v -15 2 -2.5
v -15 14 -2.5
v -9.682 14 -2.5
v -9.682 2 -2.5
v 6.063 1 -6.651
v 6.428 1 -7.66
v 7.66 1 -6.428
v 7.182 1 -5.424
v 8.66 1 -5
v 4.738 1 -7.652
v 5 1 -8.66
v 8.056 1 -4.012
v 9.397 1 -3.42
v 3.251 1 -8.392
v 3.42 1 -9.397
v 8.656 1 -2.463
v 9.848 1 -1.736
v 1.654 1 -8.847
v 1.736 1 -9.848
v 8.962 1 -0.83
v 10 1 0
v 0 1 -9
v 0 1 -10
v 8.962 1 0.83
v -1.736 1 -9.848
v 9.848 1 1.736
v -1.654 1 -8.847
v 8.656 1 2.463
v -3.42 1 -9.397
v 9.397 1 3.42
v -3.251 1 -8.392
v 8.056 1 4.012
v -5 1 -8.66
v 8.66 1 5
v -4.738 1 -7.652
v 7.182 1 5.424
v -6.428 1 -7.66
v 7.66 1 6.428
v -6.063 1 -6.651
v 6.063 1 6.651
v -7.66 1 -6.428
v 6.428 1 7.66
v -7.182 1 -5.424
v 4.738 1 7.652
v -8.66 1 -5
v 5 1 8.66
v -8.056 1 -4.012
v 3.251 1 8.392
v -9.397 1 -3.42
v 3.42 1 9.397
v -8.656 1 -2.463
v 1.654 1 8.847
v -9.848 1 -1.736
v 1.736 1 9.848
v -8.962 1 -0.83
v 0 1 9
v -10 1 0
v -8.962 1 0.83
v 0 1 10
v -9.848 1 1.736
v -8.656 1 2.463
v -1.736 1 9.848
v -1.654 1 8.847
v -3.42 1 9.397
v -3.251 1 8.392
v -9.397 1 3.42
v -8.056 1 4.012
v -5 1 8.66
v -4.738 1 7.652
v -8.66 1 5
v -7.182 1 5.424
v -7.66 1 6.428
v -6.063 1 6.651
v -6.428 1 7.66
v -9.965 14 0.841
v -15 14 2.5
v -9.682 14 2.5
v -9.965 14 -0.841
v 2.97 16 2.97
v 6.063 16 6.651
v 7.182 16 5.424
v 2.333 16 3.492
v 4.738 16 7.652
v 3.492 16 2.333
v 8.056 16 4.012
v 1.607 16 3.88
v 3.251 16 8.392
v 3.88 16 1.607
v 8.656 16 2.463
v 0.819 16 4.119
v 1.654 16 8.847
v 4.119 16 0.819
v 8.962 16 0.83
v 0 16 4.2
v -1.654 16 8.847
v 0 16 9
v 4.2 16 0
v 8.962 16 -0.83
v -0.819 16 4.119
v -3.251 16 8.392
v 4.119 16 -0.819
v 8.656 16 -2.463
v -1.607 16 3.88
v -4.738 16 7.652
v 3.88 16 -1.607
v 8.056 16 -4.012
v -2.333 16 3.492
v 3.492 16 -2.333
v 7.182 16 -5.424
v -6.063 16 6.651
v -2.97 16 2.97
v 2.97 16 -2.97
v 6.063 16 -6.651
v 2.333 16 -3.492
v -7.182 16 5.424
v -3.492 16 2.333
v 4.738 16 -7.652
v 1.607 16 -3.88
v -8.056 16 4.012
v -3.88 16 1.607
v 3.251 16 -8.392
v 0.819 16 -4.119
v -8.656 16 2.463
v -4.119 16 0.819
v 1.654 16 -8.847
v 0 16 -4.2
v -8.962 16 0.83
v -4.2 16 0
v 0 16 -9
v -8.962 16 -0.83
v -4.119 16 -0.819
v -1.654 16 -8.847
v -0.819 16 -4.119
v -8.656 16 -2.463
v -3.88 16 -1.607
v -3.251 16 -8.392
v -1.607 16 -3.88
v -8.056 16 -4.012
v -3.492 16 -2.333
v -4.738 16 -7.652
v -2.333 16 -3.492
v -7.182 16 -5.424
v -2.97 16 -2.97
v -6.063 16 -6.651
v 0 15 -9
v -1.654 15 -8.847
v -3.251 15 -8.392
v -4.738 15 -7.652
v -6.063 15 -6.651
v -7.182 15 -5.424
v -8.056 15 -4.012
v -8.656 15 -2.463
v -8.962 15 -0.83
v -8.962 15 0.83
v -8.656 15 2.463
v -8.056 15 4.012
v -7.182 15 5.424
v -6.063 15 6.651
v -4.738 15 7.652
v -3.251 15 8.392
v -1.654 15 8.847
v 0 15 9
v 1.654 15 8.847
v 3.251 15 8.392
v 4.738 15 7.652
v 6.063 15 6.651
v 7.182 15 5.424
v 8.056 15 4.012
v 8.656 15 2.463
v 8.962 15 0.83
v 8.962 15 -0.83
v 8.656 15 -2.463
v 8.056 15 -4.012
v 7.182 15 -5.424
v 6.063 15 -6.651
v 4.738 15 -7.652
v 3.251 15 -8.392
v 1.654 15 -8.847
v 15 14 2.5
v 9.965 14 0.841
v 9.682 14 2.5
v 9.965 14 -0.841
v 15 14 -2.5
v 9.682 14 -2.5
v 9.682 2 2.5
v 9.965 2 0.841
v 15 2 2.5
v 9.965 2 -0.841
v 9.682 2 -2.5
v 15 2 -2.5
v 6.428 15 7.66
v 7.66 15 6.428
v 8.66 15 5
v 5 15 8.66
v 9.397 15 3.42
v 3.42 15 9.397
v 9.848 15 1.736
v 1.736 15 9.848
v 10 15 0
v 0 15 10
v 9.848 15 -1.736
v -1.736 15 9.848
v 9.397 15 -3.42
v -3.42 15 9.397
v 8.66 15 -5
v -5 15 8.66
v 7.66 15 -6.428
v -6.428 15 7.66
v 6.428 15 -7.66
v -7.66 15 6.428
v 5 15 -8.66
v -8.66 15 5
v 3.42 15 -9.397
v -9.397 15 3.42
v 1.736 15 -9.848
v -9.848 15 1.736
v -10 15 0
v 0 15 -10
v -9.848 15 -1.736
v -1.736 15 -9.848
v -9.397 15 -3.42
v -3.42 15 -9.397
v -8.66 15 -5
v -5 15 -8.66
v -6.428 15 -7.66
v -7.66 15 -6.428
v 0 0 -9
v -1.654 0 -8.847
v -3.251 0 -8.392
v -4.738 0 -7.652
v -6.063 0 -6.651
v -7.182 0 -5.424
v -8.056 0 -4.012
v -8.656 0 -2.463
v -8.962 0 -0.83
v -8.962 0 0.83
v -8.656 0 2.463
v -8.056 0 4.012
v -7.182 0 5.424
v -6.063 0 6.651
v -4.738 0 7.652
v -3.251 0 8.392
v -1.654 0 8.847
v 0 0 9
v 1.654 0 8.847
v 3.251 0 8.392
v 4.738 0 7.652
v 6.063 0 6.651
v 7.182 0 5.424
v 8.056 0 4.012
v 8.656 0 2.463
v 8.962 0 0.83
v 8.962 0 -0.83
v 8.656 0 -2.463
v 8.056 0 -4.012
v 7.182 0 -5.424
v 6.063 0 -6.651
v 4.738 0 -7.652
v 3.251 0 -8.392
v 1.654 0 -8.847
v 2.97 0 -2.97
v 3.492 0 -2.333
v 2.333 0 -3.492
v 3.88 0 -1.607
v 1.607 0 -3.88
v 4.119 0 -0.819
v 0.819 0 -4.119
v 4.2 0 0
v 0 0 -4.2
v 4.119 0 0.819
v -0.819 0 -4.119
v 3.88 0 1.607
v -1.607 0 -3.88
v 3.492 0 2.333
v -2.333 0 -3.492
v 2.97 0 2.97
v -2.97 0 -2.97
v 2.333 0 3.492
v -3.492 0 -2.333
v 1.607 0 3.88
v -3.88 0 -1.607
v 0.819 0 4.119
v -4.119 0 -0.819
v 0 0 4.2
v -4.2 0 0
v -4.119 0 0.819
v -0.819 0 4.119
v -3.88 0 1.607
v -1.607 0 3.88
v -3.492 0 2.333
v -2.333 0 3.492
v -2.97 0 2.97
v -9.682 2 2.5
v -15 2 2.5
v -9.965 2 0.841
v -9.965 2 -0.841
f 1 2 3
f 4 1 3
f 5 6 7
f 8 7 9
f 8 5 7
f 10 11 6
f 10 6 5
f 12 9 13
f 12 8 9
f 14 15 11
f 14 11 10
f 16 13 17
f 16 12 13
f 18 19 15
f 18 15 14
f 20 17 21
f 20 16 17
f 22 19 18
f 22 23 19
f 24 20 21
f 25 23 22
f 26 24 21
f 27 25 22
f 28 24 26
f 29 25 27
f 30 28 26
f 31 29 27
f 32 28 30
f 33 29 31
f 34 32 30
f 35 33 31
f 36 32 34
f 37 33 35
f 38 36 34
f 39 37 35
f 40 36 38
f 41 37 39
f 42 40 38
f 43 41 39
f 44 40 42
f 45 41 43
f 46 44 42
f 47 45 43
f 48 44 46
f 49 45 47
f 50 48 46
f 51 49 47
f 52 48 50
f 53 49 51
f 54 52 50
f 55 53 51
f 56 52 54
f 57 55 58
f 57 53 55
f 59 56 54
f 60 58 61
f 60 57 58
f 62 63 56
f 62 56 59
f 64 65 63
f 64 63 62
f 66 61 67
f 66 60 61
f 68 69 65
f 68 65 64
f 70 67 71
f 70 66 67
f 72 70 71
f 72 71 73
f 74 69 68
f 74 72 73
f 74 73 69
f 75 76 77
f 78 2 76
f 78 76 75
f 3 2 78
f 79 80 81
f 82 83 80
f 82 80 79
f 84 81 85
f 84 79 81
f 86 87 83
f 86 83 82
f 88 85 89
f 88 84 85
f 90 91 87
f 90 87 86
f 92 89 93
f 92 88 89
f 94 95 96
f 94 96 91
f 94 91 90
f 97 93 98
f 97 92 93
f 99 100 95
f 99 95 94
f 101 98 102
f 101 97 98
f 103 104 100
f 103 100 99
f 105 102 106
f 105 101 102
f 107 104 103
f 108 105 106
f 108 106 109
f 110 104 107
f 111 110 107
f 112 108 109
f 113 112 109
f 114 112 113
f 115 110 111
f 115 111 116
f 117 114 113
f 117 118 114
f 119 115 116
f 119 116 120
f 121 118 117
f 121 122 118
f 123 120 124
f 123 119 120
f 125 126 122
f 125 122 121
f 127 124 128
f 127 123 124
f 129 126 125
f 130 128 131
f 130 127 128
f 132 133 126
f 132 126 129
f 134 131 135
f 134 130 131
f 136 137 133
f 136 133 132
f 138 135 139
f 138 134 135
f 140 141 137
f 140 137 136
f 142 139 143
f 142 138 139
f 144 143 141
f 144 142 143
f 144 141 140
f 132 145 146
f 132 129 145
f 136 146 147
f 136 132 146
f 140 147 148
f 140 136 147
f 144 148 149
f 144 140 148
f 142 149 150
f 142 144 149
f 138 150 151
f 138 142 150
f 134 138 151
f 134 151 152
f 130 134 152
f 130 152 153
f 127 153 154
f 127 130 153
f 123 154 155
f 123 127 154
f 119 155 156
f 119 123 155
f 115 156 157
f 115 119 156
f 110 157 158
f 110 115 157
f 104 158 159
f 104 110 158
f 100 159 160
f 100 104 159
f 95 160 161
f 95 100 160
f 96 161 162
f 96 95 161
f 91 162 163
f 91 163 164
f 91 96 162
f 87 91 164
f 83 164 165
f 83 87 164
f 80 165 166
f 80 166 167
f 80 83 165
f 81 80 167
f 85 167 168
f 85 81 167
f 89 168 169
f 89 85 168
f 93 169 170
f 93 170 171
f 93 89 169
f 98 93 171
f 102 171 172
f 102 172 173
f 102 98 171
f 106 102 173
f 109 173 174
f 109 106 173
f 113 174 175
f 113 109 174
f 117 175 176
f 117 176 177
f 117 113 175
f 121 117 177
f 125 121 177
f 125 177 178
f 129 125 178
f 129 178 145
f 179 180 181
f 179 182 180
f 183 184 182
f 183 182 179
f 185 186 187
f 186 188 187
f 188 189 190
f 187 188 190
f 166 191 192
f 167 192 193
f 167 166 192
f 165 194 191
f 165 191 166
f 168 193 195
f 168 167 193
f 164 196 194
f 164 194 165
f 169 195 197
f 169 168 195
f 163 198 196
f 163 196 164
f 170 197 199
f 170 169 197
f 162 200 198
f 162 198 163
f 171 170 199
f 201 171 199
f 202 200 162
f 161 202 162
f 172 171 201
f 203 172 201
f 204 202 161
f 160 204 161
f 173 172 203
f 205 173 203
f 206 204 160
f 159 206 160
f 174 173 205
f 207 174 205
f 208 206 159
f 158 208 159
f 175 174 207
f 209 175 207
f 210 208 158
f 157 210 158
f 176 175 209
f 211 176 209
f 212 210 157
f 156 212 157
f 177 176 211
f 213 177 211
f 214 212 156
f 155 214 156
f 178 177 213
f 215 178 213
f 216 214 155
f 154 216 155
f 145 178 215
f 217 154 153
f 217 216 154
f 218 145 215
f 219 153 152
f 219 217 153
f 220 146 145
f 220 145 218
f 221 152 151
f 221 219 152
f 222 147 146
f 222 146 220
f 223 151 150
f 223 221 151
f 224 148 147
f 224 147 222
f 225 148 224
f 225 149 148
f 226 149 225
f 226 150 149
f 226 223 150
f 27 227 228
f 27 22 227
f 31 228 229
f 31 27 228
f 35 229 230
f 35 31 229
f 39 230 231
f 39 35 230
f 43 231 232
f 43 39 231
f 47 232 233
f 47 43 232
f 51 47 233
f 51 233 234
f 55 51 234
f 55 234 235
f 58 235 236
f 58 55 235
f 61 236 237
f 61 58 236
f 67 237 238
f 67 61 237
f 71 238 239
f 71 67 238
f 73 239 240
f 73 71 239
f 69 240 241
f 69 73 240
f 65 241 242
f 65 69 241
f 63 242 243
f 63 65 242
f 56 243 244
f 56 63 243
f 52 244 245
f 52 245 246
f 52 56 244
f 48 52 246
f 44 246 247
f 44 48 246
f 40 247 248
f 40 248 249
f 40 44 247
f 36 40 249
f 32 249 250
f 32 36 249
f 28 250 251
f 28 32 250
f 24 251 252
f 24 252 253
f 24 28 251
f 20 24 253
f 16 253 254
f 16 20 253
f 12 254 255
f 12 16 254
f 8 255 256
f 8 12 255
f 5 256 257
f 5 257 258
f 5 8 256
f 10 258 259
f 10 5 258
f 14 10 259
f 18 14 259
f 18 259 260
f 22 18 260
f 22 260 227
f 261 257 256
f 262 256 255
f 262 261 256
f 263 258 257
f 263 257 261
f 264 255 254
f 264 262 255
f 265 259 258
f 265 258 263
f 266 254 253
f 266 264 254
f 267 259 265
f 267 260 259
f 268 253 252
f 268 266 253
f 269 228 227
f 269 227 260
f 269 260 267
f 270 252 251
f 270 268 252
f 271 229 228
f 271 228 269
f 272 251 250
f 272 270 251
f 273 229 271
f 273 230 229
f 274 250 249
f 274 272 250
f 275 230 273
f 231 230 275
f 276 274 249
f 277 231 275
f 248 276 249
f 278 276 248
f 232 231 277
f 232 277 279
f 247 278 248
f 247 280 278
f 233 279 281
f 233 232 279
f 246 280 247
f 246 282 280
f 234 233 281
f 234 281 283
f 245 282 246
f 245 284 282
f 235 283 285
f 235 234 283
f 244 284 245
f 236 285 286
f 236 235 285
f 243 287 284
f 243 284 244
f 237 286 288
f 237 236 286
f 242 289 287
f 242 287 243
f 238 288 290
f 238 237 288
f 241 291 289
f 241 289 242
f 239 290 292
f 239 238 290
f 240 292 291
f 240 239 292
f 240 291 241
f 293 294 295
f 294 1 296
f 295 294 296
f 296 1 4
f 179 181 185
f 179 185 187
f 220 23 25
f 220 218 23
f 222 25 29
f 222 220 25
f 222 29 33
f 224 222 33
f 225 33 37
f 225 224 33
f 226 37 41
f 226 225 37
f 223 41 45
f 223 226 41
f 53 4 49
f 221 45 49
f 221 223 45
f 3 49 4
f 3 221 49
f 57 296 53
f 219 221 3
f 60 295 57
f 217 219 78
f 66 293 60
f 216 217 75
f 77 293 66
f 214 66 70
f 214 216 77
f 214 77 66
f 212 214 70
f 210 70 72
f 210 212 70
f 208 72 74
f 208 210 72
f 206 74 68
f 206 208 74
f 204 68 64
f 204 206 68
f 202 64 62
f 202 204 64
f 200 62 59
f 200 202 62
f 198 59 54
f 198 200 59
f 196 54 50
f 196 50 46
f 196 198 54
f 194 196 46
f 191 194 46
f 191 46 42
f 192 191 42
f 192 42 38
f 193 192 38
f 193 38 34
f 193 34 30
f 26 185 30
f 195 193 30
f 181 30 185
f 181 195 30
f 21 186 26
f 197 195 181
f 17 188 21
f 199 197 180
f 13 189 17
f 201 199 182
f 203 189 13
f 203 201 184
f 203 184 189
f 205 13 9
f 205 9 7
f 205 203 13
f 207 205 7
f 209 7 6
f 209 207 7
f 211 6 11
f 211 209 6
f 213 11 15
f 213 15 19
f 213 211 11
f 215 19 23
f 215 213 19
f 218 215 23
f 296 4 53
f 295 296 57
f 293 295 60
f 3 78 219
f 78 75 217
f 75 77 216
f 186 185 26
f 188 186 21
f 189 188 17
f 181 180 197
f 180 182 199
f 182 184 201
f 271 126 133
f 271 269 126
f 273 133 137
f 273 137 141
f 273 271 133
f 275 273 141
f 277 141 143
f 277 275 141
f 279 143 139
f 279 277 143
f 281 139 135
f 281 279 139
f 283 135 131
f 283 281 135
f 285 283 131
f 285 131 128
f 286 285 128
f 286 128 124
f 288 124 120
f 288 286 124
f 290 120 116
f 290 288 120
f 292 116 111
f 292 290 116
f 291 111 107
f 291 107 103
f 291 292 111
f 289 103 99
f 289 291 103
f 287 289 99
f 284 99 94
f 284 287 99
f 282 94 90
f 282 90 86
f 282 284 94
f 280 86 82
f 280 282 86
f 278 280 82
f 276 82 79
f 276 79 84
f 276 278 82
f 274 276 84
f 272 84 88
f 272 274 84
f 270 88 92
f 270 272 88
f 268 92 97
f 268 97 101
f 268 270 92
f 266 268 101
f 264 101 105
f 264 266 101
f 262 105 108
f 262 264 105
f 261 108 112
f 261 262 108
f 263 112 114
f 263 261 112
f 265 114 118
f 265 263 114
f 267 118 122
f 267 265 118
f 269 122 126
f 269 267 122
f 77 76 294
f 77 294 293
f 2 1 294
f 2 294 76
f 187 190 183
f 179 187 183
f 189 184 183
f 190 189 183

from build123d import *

# Parameters (mm, degrees)
SKETCH_3_W              = 7
SKETCH_3_H              = 12
CONTINUOUS_TONGUE_DEPTH = 5
SKETCH_4_W              = 7
SKETCH_4_H              = 12
EXTRUDE_2_DEPTH         = 5


with BuildPart() as part:
    # 草图1 → Round_nut (revolve)
    with BuildSketch(Plane.XY, mode=Mode.PRIVATE) as round_nut_sk:
        Polygon((4.2, 0), (9, 0), (9, 1), (10, 1), (10, 15), (9, 15), (9, 16), (4.2, 16), align=None)
    revolve(round_nut_sk.sketch.rotate(Axis((0, 0, 0), (0, 1, 0)), 90), axis=Axis((0, 0, 0), (0, 1, 0)))

    # 草图3 → Continuous_tongue (add)
    with BuildSketch(Plane.XY.offset(-2.5)):
        with Locations((-11.5, 8)):
            Rectangle(SKETCH_3_W, SKETCH_3_H)
    extrude(amount=CONTINUOUS_TONGUE_DEPTH)

    # 草图4 → 凸台-拉伸2 (add)
    with BuildSketch(Plane.XY.offset(-2.5)):
        with Locations((11.5, 8)):
            Rectangle(SKETCH_4_W, SKETCH_4_H)
    extrude(amount=EXTRUDE_2_DEPTH)


solid = part.part
